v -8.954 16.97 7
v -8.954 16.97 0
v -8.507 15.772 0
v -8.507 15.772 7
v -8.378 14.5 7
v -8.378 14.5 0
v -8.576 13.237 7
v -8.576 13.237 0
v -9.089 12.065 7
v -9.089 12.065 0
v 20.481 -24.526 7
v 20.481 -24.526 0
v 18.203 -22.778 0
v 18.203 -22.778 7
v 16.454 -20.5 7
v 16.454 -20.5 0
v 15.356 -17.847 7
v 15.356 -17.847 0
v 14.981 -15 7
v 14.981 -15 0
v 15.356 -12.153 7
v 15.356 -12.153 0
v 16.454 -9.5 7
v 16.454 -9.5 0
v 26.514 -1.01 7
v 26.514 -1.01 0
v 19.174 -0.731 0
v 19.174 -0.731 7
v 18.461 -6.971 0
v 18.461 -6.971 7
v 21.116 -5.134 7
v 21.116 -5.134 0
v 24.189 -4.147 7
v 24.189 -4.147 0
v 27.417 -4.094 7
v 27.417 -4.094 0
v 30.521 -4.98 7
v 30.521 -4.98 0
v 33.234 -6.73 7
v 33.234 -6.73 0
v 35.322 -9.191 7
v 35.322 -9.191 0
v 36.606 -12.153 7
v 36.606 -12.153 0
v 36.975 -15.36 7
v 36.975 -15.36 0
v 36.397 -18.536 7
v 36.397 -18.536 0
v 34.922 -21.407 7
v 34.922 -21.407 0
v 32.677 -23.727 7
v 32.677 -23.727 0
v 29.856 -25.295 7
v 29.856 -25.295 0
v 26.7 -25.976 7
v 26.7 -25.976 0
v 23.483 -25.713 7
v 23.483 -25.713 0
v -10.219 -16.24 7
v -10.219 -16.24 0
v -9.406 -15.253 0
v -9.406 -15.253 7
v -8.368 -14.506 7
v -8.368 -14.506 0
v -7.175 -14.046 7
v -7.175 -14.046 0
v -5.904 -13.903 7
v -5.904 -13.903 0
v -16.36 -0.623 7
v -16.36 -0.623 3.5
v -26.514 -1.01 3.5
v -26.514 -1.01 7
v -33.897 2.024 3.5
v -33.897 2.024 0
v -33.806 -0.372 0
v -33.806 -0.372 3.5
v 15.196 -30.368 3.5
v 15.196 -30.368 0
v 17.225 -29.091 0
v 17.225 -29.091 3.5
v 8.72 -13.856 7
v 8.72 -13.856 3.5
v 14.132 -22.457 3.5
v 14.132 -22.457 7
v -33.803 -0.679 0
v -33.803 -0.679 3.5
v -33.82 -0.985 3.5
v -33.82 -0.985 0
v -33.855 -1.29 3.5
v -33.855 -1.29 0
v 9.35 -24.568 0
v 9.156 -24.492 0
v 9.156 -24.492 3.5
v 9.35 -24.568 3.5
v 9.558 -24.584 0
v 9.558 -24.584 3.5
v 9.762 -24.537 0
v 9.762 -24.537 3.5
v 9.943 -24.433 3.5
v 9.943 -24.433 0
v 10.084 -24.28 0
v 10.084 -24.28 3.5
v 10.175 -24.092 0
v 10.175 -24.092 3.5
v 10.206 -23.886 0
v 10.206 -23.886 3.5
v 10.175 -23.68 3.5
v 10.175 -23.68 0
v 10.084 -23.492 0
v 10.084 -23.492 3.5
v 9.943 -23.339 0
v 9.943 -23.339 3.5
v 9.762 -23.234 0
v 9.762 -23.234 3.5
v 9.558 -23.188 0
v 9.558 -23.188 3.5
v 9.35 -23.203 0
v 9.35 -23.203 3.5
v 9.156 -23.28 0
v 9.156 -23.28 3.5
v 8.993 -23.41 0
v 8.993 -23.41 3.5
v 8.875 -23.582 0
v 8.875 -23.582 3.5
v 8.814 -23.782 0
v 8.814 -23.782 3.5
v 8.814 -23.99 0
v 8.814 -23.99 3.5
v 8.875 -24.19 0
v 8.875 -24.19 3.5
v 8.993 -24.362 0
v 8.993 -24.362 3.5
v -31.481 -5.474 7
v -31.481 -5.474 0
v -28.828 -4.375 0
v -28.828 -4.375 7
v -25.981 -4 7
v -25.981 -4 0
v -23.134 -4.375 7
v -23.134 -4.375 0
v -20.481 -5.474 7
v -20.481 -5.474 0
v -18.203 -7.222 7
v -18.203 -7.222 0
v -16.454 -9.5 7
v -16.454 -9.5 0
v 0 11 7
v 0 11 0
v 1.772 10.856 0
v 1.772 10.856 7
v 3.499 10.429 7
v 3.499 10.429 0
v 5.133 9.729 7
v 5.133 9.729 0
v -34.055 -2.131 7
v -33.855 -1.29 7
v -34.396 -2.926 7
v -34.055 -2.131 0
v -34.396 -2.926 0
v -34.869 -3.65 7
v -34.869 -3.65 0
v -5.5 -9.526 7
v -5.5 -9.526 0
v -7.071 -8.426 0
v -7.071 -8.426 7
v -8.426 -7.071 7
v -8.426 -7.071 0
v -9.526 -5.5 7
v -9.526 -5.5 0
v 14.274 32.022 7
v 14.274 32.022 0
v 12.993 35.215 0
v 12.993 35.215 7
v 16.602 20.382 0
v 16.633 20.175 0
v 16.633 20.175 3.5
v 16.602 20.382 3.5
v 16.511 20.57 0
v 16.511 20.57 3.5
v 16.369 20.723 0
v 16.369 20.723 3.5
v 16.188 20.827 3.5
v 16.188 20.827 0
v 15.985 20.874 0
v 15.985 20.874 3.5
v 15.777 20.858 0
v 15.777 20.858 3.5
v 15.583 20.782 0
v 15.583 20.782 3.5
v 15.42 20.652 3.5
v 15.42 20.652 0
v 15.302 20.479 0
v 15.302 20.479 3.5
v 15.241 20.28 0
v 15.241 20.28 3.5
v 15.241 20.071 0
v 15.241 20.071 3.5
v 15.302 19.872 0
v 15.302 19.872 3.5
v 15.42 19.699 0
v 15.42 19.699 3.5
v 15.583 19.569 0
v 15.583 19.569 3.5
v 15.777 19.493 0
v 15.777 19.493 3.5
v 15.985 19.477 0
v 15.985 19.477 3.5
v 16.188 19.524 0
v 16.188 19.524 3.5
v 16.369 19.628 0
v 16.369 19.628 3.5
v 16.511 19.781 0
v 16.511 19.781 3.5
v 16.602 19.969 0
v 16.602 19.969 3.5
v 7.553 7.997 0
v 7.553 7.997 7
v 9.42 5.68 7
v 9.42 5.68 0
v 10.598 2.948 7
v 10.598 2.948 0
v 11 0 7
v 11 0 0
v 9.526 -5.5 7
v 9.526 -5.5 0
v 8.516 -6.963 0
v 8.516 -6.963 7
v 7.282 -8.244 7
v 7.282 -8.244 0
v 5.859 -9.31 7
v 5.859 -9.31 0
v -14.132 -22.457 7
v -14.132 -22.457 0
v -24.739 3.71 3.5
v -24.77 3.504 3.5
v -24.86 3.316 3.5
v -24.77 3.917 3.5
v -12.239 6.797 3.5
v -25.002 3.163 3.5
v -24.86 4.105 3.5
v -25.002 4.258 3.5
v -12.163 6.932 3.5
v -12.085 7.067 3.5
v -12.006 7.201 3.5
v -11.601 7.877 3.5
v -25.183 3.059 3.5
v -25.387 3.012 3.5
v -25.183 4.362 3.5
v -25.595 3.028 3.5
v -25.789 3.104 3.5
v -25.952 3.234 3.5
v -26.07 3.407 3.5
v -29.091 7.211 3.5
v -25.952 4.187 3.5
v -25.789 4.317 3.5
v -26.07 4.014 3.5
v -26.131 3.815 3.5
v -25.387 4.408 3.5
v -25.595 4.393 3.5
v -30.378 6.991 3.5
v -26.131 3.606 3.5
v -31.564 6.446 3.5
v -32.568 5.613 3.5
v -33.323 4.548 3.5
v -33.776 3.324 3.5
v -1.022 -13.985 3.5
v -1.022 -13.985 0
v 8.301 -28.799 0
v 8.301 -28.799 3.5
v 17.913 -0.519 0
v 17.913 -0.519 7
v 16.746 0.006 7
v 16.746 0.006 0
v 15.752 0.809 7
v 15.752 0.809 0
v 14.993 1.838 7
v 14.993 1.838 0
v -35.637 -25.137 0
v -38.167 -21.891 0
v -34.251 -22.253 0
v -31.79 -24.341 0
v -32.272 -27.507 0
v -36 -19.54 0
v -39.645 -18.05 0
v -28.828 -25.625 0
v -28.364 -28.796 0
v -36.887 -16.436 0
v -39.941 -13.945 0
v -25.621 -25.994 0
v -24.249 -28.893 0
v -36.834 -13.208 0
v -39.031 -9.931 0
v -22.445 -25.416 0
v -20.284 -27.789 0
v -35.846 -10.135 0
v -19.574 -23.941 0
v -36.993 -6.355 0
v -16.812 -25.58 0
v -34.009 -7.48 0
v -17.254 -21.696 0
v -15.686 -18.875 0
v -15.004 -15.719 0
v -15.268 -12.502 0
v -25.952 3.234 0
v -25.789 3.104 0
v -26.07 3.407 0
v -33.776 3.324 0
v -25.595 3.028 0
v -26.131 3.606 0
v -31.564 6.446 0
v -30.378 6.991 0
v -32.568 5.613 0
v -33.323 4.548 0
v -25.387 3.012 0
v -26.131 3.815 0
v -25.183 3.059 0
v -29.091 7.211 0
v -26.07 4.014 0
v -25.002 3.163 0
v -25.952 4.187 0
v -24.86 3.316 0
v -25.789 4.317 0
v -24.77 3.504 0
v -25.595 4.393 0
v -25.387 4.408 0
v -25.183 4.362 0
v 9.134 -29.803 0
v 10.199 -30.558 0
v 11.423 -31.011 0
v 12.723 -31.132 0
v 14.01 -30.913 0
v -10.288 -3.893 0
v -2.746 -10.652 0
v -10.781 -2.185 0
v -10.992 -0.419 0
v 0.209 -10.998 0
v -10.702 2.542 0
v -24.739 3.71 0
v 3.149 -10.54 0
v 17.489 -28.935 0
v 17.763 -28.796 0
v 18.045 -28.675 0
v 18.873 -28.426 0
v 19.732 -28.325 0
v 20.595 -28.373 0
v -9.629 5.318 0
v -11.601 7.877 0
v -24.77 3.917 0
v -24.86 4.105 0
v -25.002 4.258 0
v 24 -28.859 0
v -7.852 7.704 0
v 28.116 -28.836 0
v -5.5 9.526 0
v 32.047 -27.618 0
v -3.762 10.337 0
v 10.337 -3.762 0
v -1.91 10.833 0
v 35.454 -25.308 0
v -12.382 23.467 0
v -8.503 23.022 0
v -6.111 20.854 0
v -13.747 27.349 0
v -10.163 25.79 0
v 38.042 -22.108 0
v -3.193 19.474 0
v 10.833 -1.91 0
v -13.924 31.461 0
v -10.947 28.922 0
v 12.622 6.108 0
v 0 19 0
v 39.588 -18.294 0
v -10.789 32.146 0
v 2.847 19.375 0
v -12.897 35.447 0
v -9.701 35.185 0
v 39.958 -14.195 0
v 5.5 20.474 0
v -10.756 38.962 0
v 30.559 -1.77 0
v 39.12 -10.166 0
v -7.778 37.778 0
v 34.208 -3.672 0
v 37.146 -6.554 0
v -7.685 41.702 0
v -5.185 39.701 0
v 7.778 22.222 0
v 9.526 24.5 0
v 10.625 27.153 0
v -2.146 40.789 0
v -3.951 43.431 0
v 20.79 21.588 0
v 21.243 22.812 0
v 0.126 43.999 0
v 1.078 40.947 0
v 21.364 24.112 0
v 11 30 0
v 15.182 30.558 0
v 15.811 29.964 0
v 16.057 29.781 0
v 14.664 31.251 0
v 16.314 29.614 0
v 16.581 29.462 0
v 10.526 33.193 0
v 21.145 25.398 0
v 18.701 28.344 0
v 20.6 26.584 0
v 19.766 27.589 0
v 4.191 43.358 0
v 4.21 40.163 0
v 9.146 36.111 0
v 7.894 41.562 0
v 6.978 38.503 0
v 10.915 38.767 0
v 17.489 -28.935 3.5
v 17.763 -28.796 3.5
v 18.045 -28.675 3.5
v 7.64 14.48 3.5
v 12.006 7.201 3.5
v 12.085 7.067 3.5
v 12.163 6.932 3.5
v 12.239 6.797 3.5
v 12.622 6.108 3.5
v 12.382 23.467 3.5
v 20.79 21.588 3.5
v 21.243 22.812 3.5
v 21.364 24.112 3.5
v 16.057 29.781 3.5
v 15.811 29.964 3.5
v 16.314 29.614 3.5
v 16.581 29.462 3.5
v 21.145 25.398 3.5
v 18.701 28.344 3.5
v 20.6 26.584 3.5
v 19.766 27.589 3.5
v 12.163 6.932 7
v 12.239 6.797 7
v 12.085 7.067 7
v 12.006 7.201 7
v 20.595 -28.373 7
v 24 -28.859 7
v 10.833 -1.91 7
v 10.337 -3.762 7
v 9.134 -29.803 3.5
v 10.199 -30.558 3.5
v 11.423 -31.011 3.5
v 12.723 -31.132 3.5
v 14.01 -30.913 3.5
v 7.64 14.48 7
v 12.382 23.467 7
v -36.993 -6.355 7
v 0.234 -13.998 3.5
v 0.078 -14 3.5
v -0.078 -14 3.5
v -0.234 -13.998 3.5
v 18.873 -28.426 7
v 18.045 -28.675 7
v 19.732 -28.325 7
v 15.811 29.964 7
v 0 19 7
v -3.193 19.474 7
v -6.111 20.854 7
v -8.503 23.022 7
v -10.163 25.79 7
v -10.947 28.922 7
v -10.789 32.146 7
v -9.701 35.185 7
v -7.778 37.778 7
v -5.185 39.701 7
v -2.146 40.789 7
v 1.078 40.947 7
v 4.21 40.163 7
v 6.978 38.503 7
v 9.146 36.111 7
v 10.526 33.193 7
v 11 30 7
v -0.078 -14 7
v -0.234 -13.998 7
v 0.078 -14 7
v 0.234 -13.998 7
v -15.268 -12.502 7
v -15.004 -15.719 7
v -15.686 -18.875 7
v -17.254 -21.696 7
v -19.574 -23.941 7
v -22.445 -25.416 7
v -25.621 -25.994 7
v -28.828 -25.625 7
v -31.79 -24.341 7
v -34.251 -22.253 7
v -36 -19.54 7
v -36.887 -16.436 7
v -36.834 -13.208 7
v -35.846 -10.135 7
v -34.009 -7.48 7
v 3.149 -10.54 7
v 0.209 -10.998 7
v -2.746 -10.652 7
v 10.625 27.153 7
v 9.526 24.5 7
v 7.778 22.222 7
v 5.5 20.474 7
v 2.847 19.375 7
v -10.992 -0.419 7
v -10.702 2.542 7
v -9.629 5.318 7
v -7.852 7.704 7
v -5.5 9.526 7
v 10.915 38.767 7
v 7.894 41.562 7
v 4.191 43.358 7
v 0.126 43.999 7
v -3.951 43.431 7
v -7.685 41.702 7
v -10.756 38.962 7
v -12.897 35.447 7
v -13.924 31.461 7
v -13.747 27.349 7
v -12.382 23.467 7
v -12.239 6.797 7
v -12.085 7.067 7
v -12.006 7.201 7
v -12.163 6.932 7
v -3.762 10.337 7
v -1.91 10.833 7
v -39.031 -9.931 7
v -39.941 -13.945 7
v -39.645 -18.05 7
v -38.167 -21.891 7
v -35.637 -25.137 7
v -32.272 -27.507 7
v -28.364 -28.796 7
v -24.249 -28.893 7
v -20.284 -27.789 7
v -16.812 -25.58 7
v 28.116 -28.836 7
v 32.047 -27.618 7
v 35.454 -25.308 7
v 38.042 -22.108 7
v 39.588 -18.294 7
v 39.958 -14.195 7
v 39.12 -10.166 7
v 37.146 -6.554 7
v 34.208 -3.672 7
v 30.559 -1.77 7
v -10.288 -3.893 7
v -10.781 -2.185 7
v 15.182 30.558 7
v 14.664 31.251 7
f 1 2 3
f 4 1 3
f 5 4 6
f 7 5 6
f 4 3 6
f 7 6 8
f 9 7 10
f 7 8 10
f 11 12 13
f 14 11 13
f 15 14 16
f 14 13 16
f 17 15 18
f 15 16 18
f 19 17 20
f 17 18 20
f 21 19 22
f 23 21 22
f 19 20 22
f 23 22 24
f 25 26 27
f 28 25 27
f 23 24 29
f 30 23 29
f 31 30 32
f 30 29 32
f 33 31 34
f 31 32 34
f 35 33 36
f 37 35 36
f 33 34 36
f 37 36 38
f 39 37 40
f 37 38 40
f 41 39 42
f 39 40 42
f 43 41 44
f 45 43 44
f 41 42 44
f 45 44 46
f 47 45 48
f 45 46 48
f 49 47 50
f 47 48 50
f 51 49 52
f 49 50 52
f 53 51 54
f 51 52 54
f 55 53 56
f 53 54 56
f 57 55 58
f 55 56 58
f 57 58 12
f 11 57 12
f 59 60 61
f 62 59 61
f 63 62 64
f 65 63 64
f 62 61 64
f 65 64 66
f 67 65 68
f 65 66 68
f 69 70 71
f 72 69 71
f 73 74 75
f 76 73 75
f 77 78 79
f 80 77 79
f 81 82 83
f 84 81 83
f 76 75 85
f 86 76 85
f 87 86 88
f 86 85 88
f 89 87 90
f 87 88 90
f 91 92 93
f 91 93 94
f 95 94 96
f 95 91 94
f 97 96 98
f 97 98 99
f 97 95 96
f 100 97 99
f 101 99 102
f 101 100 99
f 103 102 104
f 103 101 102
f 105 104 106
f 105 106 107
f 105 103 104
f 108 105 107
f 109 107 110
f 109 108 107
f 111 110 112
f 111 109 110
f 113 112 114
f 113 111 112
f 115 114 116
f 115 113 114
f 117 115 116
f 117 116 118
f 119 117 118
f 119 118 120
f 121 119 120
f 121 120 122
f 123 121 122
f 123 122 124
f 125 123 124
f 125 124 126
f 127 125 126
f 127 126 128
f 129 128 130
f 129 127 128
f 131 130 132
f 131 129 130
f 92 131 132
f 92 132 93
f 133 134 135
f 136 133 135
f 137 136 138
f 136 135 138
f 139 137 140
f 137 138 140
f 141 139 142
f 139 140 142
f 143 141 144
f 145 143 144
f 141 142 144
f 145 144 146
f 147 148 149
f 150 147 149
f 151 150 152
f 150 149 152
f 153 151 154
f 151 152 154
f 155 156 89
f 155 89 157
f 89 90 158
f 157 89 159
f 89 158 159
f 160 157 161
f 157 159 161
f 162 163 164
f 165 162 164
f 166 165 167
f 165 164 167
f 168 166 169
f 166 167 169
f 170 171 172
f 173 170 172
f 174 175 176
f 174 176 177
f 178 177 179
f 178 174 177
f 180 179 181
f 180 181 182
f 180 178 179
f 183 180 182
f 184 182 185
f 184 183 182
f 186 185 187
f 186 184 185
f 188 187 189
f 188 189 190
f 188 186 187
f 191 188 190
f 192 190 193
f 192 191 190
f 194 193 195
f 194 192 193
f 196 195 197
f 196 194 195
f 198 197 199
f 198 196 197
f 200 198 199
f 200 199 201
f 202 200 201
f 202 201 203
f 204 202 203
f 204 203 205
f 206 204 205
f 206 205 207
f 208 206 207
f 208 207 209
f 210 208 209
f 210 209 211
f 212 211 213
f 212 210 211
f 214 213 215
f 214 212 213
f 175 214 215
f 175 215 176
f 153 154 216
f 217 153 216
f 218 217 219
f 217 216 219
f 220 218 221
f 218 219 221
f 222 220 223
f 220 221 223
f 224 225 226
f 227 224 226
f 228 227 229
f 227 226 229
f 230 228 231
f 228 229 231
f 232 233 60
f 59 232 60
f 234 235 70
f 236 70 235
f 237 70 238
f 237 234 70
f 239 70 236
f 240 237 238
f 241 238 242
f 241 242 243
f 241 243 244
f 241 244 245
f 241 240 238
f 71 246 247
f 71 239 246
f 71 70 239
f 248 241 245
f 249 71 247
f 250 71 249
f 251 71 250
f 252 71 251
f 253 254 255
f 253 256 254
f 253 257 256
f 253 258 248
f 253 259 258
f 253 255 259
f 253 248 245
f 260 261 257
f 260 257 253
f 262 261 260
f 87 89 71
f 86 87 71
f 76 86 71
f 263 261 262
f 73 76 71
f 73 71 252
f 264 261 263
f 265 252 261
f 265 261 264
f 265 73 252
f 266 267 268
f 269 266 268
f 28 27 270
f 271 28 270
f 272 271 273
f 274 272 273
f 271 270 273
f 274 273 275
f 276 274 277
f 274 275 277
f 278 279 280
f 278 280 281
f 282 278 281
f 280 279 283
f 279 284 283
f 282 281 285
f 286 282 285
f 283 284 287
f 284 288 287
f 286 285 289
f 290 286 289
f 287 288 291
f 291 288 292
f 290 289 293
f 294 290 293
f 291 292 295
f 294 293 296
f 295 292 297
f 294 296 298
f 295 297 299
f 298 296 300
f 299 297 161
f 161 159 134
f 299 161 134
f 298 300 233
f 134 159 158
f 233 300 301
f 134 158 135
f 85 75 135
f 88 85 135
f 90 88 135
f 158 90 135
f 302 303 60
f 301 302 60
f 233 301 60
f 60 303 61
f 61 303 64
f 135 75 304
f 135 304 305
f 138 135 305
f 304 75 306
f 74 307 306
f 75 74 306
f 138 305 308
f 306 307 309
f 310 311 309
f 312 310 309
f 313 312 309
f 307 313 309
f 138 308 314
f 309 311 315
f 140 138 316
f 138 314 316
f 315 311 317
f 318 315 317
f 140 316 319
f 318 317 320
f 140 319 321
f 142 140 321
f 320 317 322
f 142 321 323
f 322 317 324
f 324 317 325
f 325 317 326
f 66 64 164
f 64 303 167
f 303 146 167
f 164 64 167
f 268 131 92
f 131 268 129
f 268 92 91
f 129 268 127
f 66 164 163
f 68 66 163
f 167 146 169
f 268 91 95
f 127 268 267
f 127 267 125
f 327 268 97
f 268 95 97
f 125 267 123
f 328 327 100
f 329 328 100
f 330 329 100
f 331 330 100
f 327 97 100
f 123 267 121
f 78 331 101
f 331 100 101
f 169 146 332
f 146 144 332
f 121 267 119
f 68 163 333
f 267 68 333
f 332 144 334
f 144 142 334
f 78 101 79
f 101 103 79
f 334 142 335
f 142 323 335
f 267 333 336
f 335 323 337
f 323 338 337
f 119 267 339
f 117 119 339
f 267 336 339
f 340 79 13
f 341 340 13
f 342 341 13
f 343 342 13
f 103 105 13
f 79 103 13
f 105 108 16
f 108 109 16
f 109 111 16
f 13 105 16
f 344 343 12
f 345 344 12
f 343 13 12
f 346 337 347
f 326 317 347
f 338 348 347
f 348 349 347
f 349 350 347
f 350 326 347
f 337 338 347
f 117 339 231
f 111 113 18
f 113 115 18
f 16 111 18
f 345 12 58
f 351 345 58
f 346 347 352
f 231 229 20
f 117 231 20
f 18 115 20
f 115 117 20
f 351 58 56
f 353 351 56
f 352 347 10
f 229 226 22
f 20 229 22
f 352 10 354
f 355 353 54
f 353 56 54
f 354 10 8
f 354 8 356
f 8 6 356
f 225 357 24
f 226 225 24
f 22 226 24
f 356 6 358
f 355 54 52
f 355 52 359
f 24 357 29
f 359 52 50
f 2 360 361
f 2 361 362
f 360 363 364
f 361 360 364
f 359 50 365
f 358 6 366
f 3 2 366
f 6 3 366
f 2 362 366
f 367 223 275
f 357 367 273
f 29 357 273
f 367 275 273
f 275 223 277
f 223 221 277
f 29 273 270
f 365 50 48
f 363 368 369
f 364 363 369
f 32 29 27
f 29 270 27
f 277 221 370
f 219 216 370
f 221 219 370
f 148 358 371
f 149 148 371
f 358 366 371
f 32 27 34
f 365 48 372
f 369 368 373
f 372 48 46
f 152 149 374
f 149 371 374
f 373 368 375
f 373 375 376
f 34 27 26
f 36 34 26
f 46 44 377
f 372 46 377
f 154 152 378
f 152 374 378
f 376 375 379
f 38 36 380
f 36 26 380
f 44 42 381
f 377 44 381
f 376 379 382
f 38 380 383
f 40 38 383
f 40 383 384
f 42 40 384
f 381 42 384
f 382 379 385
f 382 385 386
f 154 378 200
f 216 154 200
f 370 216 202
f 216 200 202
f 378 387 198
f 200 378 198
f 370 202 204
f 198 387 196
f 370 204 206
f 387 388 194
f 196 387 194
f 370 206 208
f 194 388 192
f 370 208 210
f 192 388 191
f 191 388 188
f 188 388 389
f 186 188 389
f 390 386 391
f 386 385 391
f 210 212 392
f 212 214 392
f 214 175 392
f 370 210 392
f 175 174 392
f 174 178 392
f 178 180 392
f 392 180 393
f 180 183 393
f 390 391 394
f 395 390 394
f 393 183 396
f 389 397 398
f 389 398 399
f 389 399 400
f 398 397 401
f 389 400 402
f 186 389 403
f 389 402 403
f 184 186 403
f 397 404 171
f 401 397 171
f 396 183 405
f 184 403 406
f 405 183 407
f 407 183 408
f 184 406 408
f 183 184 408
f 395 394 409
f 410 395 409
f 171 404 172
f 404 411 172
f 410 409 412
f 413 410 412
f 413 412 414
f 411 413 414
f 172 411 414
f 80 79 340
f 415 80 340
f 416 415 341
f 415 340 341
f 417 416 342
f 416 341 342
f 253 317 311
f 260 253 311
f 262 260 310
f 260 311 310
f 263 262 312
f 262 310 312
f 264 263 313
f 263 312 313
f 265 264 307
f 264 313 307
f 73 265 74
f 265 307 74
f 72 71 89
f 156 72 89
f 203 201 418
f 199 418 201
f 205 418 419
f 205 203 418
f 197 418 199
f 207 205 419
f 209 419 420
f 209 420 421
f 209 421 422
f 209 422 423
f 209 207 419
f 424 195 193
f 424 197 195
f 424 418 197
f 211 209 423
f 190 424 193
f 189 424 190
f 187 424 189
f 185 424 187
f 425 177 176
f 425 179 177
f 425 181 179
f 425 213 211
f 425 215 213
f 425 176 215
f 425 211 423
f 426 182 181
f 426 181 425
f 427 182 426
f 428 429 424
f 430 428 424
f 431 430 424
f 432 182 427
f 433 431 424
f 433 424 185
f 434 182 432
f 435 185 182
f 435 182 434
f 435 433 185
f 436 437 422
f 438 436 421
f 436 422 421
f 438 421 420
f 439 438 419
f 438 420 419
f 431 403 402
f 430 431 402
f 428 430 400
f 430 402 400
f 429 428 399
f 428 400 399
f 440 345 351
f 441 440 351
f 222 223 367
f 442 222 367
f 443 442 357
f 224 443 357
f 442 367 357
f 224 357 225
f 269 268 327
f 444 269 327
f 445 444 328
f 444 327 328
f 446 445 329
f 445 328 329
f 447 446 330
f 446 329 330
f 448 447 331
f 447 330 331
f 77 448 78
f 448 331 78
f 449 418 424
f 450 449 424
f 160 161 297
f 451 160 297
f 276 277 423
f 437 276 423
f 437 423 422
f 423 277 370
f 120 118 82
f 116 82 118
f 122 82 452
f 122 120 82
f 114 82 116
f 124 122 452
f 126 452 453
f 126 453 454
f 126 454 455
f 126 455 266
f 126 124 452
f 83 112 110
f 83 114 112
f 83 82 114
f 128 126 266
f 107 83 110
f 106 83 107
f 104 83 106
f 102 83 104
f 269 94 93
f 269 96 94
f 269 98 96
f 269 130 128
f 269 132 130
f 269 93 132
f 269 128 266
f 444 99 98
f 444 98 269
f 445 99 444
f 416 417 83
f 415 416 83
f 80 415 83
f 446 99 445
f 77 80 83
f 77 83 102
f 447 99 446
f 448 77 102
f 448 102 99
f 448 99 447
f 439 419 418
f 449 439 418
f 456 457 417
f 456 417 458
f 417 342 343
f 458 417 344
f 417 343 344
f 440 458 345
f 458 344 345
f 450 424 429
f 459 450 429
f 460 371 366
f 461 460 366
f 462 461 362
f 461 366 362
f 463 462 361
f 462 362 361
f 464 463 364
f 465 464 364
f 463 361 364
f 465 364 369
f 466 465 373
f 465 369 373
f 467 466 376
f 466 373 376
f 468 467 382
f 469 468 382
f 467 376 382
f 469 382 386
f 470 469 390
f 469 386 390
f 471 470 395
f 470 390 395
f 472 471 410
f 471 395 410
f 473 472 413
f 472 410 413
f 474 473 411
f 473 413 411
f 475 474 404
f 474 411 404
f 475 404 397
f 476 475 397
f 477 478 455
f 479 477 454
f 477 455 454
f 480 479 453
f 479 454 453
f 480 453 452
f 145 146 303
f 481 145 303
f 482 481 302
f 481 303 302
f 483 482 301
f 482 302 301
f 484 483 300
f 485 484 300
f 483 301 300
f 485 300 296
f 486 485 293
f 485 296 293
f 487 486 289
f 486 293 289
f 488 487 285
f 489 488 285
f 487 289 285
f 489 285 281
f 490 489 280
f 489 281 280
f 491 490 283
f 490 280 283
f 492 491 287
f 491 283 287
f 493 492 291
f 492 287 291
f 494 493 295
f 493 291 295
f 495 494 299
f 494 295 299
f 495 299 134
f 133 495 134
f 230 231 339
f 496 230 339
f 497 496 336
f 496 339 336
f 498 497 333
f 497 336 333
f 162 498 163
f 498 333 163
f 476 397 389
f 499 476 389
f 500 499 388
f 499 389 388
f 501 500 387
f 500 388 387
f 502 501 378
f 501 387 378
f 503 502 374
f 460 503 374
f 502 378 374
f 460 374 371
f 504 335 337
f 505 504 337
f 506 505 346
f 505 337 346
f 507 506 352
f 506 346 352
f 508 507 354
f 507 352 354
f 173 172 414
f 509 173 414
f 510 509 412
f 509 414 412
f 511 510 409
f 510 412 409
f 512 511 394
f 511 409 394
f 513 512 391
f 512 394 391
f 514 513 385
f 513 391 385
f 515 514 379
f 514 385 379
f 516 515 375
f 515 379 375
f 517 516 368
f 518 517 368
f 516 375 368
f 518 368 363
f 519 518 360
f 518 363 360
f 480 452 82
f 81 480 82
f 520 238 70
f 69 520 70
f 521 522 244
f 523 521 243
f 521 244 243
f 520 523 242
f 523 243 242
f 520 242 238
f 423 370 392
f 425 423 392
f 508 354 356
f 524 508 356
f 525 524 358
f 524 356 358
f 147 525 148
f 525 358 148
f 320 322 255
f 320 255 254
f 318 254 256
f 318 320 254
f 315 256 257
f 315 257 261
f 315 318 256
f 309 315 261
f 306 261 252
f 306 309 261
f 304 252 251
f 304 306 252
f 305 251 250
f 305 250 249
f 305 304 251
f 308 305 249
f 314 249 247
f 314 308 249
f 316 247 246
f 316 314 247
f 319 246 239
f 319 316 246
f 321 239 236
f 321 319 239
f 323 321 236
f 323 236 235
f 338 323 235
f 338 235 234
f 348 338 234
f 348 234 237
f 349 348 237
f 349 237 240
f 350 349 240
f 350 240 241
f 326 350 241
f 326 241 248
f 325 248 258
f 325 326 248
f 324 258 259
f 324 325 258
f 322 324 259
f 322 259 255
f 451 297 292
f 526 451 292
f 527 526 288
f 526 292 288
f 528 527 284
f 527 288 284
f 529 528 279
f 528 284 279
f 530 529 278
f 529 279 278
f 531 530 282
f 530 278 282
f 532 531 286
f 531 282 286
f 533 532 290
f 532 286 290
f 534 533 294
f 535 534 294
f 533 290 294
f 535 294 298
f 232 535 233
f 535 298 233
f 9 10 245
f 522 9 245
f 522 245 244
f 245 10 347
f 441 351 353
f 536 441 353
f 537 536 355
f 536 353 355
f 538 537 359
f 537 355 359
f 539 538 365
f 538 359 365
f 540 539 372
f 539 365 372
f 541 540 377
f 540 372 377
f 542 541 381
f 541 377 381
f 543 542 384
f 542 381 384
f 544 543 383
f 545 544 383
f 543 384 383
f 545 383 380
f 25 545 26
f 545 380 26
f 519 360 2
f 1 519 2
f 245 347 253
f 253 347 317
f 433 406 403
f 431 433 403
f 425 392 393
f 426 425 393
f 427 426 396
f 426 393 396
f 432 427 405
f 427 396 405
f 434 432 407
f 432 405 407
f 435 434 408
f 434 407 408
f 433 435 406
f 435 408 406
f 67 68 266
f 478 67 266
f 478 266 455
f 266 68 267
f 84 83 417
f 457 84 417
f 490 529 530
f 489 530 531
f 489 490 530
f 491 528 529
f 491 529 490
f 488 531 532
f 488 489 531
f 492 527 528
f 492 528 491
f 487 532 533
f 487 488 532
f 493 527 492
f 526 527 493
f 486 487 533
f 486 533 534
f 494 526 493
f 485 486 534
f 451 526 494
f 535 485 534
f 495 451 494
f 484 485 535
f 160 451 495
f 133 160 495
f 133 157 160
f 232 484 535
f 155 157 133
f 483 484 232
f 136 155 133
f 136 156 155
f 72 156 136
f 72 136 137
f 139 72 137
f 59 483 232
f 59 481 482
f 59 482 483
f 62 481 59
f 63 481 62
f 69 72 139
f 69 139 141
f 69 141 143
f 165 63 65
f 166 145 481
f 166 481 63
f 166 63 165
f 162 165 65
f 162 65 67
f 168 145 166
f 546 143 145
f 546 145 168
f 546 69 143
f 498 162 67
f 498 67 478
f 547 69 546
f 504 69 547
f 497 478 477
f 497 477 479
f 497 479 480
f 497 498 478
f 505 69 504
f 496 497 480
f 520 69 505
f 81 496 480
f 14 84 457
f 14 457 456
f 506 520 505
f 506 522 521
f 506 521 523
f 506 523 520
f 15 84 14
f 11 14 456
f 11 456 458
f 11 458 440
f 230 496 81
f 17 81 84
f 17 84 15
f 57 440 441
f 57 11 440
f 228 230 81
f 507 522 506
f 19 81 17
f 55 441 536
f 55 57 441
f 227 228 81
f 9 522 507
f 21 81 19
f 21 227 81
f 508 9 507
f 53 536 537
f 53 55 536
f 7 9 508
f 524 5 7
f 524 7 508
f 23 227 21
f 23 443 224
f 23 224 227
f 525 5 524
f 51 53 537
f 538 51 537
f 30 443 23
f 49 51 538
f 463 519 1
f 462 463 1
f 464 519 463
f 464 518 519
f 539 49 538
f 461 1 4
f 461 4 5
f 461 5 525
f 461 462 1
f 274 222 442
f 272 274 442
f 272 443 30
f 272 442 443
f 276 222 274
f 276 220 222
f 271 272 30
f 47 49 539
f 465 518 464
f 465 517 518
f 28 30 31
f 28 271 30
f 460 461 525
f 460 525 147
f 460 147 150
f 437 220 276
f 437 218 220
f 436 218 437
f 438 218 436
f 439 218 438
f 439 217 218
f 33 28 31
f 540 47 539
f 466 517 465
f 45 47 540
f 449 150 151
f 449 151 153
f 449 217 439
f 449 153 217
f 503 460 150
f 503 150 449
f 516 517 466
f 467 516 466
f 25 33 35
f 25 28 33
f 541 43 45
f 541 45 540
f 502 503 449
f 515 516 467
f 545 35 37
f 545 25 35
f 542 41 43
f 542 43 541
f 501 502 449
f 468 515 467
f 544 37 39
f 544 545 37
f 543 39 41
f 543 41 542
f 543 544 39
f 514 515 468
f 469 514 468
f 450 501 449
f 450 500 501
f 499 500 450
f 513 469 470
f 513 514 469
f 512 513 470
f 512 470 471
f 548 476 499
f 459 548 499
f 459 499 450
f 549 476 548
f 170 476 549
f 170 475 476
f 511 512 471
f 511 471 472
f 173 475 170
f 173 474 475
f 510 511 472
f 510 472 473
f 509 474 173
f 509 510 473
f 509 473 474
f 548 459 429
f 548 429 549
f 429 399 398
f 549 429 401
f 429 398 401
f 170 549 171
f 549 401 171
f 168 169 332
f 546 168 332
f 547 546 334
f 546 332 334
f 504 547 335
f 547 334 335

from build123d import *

# Parameters (mm, degrees)
F1_DEPTH = 7
F0_R     = 0.7
F2_DEPTH = 3.5
F4_COUNT = 3


with BuildPart() as f1:
    # F0 (on Top) → F1 (new body)
    with BuildSketch(Plane.XY):
        with BuildLine():
            ThreePointArc((-12.382065884, 23.4666666667), (-7.2295689129, 18.0111162599), (0, 16))
            ThreePointArc((0, 16), (7.2295689129, 18.0111162599), (12.382065884, 23.4666666667))
            ThreePointArc((12.382065884, 23.4666666667), (13.5894981949, 26.6346562119), (14, 30))
            ThreePointArc((14, 30), (13.7458495795, 32.6554885307), (12.992625809, 35.2145637005))
            ThreePointArc((12.992625809, 35.2145637005), (-5.8818761492, 42.7044690155), (-12.382065884, 23.4666666667))
        make_face()
        with BuildLine():
            ThreePointArc((11, 30), (7.7781745931, 22.2218254069), (0, 19))
            ThreePointArc((0, 19), (-7.7781745931, 37.7781745931), (11, 30))
        make_face(mode=Mode.SUBTRACT)
        with BuildLine():
            ThreePointArc((5.1333333333, 9.7287660517), (9.4198372244, 5.6803755744), (11, 0))
            ThreePointArc((11, 0), (-7.7781745931, -7.7781745931), (0, 11))
            Line((0, 11), (0, 14))
            ThreePointArc((0, 14), (-6.8986101971, 12.1823305385), (-12.0058785253, 7.2013110498))
            ThreePointArc((-12.0058785253, 7.2013110498), (-3.7361544833, -13.4922625855), (14, 0))
            ThreePointArc((14, 0), (13.6478746634, 3.1201790289), (12.6092118325, 6.0834017591))
            ThreePointArc((12.6092118325, 6.0834017591), (12.3202312733, 6.649203063), (12.0058785253, 7.2013110498))
            ThreePointArc((12.0058785253, 7.2013110498), (9.6247415159, 10.166825992), (6.5333333333, 12.382065884))
            Line((6.5333333333, 12.382065884), (5.1333333333, 9.7287660517))
        make_face()
        with BuildLine():
            ThreePointArc((0, 11), (2.6441986906, 10.6774628674), (5.1333333333, 9.7287660517))
            Line((5.1333333333, 9.7287660517), (6.5333333333, 12.382065884))
            ThreePointArc((6.5333333333, 12.382065884), (3.3653437881, 13.5894981949), (0, 14))
            Line((0, 14), (0, 11))
        make_face()
        with BuildLine():
            ThreePointArc((0, 14), (3.3653437881, 13.5894981949), (6.5333333333, 12.382065884))
            Line((6.5333333333, 12.382065884), (7.6401623132, 14.4797438458))
            Line((7.6401623132, 14.4797438458), (12.382065884, 23.4666666667))
            ThreePointArc((12.382065884, 23.4666666667), (7.2295689129, 18.0111162599), (0, 16))
            Line((0, 16), (0, 14))
        make_face()
        with BuildLine():
            ThreePointArc((-12.0058785253, 7.2013110498), (-6.8986101971, 12.1823305385), (0, 14))
            Line((0, 14), (0, 16))
            ThreePointArc((0, 16), (-7.2295689129, 18.0111162599), (-12.382065884, 23.4666666667))
            Line((-12.382065884, 23.4666666667), (-8.9542338488, 16.9701908351))
            ThreePointArc((-8.9542338488, 16.9701908351), (-8.3782746662, 14.4999604986), (-9.0885864769, 12.0649606983))
            Line((-9.0885864769, 12.0649606983), (-12.0058785253, 7.2013110498))
        make_face()
        with BuildLine():
            ThreePointArc((14, 30), (13.5894981949, 26.6346562119), (12.382065884, 23.4666666667))
            Line((12.382065884, 23.4666666667), (15.8105643506, 29.9644055284))
            ThreePointArc((15.8105643506, 29.9644055284), (14.907806517, 30.8930023195), (14.2738299895, 32.0223107225))
            Line((14.2738299895, 32.0223107225), (12.992625809, 35.2145637005))
            ThreePointArc((12.992625809, 35.2145637005), (13.7458495795, 32.6554885307), (14, 30))
        make_face()
        with BuildLine():
            Line((7.6401623132, 14.4797438458), (6.5333333333, 12.382065884))
            ThreePointArc((6.5333333333, 12.382065884), (9.6247415159, 10.166825992), (12.0058785253, 7.2013110498))
            Line((12.0058785253, 7.2013110498), (7.6401623132, 14.4797438458))
        make_face()
    extrude(amount=F1_DEPTH)

    # F0 (on Top) → F2 (join)
    with BuildSketch(Plane.XY):
        with BuildLine():
            Line((7.6401623132, 14.4797438458), (12.0058785253, 7.2013110498))
            ThreePointArc((12.0058785253, 7.2013110498), (12.3202312733, 6.649203063), (12.6092118325, 6.0834017591))
            Line((12.6092118325, 6.0834017591), (20.7901645073, 21.588059159))
            ThreePointArc((20.7901645073, 21.588059159), (21.1448577828, 25.3984205095), (18.7013314535, 28.3435588795))
            Line((18.7013314535, 28.3435588795), (16.5807201594, 29.462488514))
            ThreePointArc((16.5807201594, 29.462488514), (16.1840828281, 29.6957099063), (15.8105643506, 29.9644055284))
            Line((15.8105643506, 29.9644055284), (12.382065884, 23.4666666667))
            Line((12.382065884, 23.4666666667), (7.6401623132, 14.4797438458))
        make_face()
        with Locations((15.9327194351, 20.1754820165)):
            Circle(F0_R, mode=Mode.SUBTRACT)
    extrude(amount=F2_DEPTH)

    # F4: F1 ×3 about axis
    f4_axis = Axis((0, 0, 10), (0, 0, 1))


with BuildPart() as f1_1:
    add(f1.part)
    for i in range(1, F4_COUNT):
        add(f1.part.rotate(f4_axis, i * 360 / F4_COUNT))


solid = f1_1.part
